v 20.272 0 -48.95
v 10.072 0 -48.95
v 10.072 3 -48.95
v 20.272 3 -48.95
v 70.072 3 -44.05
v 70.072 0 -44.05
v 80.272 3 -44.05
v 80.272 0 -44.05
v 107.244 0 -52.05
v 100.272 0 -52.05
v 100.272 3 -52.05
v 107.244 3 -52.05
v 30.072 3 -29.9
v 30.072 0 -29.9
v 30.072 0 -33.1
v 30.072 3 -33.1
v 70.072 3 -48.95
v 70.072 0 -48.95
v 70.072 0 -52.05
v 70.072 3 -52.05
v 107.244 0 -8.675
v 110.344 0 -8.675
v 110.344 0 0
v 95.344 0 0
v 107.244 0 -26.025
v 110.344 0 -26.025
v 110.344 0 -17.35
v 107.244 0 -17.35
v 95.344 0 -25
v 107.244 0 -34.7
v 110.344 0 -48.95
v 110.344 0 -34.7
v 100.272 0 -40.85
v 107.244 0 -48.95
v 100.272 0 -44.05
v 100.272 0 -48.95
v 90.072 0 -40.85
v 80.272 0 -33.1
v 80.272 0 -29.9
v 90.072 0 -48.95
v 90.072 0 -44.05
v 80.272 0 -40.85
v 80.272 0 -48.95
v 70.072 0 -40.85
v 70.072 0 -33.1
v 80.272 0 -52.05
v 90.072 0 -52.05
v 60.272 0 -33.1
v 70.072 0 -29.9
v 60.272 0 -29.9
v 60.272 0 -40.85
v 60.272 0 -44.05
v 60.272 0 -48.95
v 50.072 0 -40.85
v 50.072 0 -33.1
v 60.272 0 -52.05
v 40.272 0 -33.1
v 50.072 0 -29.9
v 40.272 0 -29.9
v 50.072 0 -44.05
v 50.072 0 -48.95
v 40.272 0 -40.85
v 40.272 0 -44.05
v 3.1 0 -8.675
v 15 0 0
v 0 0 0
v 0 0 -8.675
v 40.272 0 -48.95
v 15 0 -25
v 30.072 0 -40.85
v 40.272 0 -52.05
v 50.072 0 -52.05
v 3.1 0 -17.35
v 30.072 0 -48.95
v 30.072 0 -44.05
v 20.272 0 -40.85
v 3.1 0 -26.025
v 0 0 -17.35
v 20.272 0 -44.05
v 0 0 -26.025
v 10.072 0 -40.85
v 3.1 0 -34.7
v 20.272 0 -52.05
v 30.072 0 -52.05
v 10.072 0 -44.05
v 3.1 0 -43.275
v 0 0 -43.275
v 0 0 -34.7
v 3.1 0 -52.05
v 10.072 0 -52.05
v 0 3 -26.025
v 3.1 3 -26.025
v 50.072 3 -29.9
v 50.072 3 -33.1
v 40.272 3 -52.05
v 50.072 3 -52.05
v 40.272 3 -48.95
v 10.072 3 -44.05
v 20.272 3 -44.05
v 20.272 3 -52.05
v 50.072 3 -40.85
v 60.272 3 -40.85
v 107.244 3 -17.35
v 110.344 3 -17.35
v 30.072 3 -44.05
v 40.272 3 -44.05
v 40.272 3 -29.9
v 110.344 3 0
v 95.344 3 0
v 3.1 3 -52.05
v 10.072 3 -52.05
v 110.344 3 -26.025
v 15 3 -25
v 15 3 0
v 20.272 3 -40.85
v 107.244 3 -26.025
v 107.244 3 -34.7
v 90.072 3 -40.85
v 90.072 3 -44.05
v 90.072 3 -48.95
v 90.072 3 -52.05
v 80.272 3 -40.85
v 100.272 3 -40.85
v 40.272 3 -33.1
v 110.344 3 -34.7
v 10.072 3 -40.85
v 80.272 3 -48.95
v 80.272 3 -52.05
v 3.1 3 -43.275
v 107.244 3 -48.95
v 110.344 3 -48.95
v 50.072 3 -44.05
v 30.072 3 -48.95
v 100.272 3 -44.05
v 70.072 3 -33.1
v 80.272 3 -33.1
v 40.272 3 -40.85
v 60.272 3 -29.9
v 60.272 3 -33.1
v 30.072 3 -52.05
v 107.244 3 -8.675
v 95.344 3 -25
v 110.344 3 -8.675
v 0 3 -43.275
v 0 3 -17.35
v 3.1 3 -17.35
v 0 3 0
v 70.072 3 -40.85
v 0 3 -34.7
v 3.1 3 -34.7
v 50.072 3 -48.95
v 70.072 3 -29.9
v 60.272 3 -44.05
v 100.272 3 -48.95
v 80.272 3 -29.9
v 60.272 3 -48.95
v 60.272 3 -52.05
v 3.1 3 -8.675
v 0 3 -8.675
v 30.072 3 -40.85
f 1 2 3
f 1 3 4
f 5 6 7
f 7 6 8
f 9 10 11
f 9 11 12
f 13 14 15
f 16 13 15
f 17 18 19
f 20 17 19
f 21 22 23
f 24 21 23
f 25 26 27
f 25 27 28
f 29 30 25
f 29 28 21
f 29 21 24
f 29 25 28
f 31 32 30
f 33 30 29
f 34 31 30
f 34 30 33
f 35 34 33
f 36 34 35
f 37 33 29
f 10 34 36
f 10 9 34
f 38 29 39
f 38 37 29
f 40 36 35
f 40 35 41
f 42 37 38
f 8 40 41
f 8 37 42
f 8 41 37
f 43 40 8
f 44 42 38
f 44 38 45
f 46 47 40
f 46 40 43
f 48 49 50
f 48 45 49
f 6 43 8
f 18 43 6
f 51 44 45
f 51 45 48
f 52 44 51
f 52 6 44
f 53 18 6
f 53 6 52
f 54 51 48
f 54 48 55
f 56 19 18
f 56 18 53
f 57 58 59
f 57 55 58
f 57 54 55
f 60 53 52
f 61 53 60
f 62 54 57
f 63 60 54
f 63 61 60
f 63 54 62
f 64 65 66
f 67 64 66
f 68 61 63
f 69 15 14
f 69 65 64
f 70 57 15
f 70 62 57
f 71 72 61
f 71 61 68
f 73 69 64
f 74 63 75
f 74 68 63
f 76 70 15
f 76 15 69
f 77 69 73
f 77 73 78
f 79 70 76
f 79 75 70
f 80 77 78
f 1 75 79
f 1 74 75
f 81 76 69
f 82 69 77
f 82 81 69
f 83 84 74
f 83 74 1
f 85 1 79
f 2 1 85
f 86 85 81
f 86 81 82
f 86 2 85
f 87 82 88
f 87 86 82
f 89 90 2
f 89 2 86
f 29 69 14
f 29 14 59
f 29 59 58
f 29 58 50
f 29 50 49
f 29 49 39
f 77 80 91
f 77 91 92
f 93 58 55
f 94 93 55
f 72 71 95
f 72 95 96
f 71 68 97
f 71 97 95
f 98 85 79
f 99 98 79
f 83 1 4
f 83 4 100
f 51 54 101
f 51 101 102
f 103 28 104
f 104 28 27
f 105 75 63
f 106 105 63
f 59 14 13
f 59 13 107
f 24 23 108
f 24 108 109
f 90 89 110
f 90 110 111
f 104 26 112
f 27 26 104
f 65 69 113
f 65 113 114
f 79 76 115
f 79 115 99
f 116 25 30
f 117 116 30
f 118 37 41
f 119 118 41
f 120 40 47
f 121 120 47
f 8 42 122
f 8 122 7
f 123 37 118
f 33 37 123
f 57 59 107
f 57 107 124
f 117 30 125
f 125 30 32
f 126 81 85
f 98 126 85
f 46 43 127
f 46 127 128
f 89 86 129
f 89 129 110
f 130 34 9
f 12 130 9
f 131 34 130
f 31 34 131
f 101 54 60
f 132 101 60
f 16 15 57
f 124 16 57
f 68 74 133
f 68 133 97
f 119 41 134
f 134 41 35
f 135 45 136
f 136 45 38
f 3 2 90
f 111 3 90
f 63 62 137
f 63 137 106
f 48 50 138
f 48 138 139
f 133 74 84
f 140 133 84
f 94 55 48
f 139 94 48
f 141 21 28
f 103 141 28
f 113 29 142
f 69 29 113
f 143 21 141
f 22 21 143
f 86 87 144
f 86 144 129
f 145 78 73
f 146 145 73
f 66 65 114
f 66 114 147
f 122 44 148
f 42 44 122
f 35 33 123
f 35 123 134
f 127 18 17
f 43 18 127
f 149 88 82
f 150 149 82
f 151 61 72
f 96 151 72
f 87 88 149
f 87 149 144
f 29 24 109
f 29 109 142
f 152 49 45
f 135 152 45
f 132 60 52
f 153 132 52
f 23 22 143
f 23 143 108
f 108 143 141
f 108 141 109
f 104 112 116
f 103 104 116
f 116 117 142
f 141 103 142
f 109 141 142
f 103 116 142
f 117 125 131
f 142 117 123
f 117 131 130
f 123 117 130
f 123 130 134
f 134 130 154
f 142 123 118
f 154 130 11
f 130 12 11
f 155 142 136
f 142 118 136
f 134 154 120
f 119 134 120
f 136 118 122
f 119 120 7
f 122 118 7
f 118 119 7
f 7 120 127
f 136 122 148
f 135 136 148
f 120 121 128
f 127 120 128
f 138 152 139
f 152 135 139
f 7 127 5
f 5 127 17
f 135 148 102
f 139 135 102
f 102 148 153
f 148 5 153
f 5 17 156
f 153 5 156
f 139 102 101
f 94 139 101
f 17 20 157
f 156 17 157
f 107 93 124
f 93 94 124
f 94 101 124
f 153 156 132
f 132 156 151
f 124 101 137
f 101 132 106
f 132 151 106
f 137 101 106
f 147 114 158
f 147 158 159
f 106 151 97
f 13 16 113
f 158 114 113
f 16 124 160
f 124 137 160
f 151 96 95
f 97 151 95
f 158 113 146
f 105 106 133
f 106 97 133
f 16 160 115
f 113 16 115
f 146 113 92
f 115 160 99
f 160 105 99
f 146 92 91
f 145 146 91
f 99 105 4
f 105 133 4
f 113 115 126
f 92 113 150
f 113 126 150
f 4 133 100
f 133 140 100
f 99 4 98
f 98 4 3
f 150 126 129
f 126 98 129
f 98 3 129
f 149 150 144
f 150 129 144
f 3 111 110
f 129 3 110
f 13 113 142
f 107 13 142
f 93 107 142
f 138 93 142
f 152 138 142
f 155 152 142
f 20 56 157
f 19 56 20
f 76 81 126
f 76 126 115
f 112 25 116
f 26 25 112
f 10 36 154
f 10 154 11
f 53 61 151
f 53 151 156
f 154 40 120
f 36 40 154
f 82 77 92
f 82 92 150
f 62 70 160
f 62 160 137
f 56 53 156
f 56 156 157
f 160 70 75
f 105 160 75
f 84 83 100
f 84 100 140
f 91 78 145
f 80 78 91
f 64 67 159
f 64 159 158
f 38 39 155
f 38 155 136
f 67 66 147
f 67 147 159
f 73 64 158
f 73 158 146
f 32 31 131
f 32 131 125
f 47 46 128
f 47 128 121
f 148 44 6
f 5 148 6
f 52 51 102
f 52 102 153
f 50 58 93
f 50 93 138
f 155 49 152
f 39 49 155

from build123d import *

# Parameters (mm, degrees)
BOSS_EXTRUDE1_DEPTH = 3
SKETCH2_W           = 3.2
SKETCH2_H           = 8.675
SKETCH2_H_2         = 8.875
SKETCH2_W_2         = 10.2
SKETCH2_H_3         = 3.2
CUT_EXTRUDE1_DEPTH  = 4


with BuildPart() as part:
    # Sketch1 → Boss-Extrude1 (new body)
    with BuildSketch(Plane(origin=(0, 0, 0), x_dir=(1, 0, 0), z_dir=(0, 1, 0))):
        Polygon((95.344434203, 0), (95.344434203, 25), (15, 25), (15, 0), (0, 0), (0, 52.05), (110.344434203, 52.05), (110.344434203, 0), align=None)
    extrude(amount=BOSS_EXTRUDE1_DEPTH)

    # Sketch2 → Cut-Extrude1 (cut, through all)
    with BuildSketch(Plane(origin=(0, 0, 0), x_dir=(1, 0, 0), z_dir=(0, 1, 0))):
        with Locations((1.5, 13.0125)):
            Rectangle(SKETCH2_W, SKETCH2_H)
        with Locations((1.5, 30.3625)):
            Rectangle(SKETCH2_W, SKETCH2_H)
        with Locations((1.5, 47.7125)):
            Rectangle(SKETCH2_W, SKETCH2_H_2)
        with Locations((35.172217102, 50.55)):
            Rectangle(SKETCH2_W_2, SKETCH2_H_3)
        with Locations((55.172217102, 31.5)):
            Rectangle(SKETCH2_W_2, SKETCH2_H_3)
        with Locations((55.172217102, 42.45)):
            Rectangle(SKETCH2_W_2, SKETCH2_H_3)
        with Locations((55.172217102, 50.55)):
            Rectangle(SKETCH2_W_2, SKETCH2_H_3)
        with Locations((15.172217102, 42.45)):
            Rectangle(SKETCH2_W_2, SKETCH2_H_3)
        with Locations((15.172217102, 50.55)):
            Rectangle(SKETCH2_W_2, SKETCH2_H_3)
        with Locations((35.172217102, 31.5)):
            Rectangle(SKETCH2_W_2, SKETCH2_H_3)
        with Locations((35.172217102, 42.45)):
            Rectangle(SKETCH2_W_2, SKETCH2_H_3)
        with Locations((108.844434203, 13.0125)):
            Rectangle(SKETCH2_W, SKETCH2_H)
        with Locations((95.172217102, 42.45)):
            Rectangle(SKETCH2_W_2, SKETCH2_H_3)
        with Locations((95.172217102, 50.55)):
            Rectangle(SKETCH2_W_2, SKETCH2_H_3)
        with Locations((108.844434203, 30.3625)):
            Rectangle(SKETCH2_W, SKETCH2_H)
        with Locations((75.172217102, 50.55)):
            Rectangle(SKETCH2_W_2, SKETCH2_H_3)
        with Locations((75.172217102, 42.45)):
            Rectangle(SKETCH2_W_2, SKETCH2_H_3)
        with Locations((75.172217102, 31.5)):
            Rectangle(SKETCH2_W_2, SKETCH2_H_3)
        with Locations((108.844434203, 50.55)):
            Rectangle(SKETCH2_W, SKETCH2_H_3)
    extrude(amount=CUT_EXTRUDE1_DEPTH, mode=Mode.SUBTRACT)


solid = part.part
